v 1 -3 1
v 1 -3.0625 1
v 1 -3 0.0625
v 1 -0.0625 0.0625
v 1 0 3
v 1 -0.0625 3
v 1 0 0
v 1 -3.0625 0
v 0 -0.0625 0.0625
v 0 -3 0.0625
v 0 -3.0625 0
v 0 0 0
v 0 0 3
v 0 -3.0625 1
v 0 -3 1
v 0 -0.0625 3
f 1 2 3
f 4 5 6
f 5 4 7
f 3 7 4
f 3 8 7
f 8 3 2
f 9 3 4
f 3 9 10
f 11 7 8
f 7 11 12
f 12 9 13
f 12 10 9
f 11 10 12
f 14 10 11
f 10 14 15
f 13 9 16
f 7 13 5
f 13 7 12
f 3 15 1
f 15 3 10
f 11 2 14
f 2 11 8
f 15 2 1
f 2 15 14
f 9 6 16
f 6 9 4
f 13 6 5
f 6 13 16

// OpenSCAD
// file: parts.scad
module rectangularTube(height, width, length, thickness) {
    difference()
    {
        cube([height, width, length]);
        translate([thickness, thickness, 0]) {
            cube([height - 2*thickness, width - 2*thickness, length]);
        };
    }
};

module angleIron(height, width, length, thickness) {
    union()
    {
        cube([height, thickness, length]);
        rotate([0, -90, 0]) {
            translate([0, 0, -1 * thickness]) {
                cube([length, width, thickness]);
            }
        }
    }
}

module circularTube(outer, thickness, length) {
    outerRadius = outer / 2;
    innerRadius = outerRadius - thickness;
    difference() {
        cylinder(length, outerRadius, outerRadius, $fn=32);
        cylinder(length, innerRadius, innerRadius, $fn=32);
    }

}

module flatBar(thickness, width, length) {
    cube([width, length, thickness]);
}


rectangularTube(4, 4, 12, .25);

translate([ 10, 0, 0]) {
    angleIron( 4, 4, 12, .25);
}

translate([ 22, 2, 0]) {
    tube(4, .25, 12);
}

translate([ 30, 0, 0]) {
    rotate([90, 0, 0]) {
        flatBar(.25, 4, 12);
    }
}
// main file
use <parts.scad>;

module bar(length) {
    flatBar(1/16, 1, length);
    echo("Flat bar: 1/16x1  Length: ", length);
}

length = 3;
height = 3;

rotate([90, 0, 0]) {
    bar(height);
}

translate([0, -1 * length, 0]) {
    bar(length);

    rotate([90, 0, 0]) {
        bar(1);
    }
}
